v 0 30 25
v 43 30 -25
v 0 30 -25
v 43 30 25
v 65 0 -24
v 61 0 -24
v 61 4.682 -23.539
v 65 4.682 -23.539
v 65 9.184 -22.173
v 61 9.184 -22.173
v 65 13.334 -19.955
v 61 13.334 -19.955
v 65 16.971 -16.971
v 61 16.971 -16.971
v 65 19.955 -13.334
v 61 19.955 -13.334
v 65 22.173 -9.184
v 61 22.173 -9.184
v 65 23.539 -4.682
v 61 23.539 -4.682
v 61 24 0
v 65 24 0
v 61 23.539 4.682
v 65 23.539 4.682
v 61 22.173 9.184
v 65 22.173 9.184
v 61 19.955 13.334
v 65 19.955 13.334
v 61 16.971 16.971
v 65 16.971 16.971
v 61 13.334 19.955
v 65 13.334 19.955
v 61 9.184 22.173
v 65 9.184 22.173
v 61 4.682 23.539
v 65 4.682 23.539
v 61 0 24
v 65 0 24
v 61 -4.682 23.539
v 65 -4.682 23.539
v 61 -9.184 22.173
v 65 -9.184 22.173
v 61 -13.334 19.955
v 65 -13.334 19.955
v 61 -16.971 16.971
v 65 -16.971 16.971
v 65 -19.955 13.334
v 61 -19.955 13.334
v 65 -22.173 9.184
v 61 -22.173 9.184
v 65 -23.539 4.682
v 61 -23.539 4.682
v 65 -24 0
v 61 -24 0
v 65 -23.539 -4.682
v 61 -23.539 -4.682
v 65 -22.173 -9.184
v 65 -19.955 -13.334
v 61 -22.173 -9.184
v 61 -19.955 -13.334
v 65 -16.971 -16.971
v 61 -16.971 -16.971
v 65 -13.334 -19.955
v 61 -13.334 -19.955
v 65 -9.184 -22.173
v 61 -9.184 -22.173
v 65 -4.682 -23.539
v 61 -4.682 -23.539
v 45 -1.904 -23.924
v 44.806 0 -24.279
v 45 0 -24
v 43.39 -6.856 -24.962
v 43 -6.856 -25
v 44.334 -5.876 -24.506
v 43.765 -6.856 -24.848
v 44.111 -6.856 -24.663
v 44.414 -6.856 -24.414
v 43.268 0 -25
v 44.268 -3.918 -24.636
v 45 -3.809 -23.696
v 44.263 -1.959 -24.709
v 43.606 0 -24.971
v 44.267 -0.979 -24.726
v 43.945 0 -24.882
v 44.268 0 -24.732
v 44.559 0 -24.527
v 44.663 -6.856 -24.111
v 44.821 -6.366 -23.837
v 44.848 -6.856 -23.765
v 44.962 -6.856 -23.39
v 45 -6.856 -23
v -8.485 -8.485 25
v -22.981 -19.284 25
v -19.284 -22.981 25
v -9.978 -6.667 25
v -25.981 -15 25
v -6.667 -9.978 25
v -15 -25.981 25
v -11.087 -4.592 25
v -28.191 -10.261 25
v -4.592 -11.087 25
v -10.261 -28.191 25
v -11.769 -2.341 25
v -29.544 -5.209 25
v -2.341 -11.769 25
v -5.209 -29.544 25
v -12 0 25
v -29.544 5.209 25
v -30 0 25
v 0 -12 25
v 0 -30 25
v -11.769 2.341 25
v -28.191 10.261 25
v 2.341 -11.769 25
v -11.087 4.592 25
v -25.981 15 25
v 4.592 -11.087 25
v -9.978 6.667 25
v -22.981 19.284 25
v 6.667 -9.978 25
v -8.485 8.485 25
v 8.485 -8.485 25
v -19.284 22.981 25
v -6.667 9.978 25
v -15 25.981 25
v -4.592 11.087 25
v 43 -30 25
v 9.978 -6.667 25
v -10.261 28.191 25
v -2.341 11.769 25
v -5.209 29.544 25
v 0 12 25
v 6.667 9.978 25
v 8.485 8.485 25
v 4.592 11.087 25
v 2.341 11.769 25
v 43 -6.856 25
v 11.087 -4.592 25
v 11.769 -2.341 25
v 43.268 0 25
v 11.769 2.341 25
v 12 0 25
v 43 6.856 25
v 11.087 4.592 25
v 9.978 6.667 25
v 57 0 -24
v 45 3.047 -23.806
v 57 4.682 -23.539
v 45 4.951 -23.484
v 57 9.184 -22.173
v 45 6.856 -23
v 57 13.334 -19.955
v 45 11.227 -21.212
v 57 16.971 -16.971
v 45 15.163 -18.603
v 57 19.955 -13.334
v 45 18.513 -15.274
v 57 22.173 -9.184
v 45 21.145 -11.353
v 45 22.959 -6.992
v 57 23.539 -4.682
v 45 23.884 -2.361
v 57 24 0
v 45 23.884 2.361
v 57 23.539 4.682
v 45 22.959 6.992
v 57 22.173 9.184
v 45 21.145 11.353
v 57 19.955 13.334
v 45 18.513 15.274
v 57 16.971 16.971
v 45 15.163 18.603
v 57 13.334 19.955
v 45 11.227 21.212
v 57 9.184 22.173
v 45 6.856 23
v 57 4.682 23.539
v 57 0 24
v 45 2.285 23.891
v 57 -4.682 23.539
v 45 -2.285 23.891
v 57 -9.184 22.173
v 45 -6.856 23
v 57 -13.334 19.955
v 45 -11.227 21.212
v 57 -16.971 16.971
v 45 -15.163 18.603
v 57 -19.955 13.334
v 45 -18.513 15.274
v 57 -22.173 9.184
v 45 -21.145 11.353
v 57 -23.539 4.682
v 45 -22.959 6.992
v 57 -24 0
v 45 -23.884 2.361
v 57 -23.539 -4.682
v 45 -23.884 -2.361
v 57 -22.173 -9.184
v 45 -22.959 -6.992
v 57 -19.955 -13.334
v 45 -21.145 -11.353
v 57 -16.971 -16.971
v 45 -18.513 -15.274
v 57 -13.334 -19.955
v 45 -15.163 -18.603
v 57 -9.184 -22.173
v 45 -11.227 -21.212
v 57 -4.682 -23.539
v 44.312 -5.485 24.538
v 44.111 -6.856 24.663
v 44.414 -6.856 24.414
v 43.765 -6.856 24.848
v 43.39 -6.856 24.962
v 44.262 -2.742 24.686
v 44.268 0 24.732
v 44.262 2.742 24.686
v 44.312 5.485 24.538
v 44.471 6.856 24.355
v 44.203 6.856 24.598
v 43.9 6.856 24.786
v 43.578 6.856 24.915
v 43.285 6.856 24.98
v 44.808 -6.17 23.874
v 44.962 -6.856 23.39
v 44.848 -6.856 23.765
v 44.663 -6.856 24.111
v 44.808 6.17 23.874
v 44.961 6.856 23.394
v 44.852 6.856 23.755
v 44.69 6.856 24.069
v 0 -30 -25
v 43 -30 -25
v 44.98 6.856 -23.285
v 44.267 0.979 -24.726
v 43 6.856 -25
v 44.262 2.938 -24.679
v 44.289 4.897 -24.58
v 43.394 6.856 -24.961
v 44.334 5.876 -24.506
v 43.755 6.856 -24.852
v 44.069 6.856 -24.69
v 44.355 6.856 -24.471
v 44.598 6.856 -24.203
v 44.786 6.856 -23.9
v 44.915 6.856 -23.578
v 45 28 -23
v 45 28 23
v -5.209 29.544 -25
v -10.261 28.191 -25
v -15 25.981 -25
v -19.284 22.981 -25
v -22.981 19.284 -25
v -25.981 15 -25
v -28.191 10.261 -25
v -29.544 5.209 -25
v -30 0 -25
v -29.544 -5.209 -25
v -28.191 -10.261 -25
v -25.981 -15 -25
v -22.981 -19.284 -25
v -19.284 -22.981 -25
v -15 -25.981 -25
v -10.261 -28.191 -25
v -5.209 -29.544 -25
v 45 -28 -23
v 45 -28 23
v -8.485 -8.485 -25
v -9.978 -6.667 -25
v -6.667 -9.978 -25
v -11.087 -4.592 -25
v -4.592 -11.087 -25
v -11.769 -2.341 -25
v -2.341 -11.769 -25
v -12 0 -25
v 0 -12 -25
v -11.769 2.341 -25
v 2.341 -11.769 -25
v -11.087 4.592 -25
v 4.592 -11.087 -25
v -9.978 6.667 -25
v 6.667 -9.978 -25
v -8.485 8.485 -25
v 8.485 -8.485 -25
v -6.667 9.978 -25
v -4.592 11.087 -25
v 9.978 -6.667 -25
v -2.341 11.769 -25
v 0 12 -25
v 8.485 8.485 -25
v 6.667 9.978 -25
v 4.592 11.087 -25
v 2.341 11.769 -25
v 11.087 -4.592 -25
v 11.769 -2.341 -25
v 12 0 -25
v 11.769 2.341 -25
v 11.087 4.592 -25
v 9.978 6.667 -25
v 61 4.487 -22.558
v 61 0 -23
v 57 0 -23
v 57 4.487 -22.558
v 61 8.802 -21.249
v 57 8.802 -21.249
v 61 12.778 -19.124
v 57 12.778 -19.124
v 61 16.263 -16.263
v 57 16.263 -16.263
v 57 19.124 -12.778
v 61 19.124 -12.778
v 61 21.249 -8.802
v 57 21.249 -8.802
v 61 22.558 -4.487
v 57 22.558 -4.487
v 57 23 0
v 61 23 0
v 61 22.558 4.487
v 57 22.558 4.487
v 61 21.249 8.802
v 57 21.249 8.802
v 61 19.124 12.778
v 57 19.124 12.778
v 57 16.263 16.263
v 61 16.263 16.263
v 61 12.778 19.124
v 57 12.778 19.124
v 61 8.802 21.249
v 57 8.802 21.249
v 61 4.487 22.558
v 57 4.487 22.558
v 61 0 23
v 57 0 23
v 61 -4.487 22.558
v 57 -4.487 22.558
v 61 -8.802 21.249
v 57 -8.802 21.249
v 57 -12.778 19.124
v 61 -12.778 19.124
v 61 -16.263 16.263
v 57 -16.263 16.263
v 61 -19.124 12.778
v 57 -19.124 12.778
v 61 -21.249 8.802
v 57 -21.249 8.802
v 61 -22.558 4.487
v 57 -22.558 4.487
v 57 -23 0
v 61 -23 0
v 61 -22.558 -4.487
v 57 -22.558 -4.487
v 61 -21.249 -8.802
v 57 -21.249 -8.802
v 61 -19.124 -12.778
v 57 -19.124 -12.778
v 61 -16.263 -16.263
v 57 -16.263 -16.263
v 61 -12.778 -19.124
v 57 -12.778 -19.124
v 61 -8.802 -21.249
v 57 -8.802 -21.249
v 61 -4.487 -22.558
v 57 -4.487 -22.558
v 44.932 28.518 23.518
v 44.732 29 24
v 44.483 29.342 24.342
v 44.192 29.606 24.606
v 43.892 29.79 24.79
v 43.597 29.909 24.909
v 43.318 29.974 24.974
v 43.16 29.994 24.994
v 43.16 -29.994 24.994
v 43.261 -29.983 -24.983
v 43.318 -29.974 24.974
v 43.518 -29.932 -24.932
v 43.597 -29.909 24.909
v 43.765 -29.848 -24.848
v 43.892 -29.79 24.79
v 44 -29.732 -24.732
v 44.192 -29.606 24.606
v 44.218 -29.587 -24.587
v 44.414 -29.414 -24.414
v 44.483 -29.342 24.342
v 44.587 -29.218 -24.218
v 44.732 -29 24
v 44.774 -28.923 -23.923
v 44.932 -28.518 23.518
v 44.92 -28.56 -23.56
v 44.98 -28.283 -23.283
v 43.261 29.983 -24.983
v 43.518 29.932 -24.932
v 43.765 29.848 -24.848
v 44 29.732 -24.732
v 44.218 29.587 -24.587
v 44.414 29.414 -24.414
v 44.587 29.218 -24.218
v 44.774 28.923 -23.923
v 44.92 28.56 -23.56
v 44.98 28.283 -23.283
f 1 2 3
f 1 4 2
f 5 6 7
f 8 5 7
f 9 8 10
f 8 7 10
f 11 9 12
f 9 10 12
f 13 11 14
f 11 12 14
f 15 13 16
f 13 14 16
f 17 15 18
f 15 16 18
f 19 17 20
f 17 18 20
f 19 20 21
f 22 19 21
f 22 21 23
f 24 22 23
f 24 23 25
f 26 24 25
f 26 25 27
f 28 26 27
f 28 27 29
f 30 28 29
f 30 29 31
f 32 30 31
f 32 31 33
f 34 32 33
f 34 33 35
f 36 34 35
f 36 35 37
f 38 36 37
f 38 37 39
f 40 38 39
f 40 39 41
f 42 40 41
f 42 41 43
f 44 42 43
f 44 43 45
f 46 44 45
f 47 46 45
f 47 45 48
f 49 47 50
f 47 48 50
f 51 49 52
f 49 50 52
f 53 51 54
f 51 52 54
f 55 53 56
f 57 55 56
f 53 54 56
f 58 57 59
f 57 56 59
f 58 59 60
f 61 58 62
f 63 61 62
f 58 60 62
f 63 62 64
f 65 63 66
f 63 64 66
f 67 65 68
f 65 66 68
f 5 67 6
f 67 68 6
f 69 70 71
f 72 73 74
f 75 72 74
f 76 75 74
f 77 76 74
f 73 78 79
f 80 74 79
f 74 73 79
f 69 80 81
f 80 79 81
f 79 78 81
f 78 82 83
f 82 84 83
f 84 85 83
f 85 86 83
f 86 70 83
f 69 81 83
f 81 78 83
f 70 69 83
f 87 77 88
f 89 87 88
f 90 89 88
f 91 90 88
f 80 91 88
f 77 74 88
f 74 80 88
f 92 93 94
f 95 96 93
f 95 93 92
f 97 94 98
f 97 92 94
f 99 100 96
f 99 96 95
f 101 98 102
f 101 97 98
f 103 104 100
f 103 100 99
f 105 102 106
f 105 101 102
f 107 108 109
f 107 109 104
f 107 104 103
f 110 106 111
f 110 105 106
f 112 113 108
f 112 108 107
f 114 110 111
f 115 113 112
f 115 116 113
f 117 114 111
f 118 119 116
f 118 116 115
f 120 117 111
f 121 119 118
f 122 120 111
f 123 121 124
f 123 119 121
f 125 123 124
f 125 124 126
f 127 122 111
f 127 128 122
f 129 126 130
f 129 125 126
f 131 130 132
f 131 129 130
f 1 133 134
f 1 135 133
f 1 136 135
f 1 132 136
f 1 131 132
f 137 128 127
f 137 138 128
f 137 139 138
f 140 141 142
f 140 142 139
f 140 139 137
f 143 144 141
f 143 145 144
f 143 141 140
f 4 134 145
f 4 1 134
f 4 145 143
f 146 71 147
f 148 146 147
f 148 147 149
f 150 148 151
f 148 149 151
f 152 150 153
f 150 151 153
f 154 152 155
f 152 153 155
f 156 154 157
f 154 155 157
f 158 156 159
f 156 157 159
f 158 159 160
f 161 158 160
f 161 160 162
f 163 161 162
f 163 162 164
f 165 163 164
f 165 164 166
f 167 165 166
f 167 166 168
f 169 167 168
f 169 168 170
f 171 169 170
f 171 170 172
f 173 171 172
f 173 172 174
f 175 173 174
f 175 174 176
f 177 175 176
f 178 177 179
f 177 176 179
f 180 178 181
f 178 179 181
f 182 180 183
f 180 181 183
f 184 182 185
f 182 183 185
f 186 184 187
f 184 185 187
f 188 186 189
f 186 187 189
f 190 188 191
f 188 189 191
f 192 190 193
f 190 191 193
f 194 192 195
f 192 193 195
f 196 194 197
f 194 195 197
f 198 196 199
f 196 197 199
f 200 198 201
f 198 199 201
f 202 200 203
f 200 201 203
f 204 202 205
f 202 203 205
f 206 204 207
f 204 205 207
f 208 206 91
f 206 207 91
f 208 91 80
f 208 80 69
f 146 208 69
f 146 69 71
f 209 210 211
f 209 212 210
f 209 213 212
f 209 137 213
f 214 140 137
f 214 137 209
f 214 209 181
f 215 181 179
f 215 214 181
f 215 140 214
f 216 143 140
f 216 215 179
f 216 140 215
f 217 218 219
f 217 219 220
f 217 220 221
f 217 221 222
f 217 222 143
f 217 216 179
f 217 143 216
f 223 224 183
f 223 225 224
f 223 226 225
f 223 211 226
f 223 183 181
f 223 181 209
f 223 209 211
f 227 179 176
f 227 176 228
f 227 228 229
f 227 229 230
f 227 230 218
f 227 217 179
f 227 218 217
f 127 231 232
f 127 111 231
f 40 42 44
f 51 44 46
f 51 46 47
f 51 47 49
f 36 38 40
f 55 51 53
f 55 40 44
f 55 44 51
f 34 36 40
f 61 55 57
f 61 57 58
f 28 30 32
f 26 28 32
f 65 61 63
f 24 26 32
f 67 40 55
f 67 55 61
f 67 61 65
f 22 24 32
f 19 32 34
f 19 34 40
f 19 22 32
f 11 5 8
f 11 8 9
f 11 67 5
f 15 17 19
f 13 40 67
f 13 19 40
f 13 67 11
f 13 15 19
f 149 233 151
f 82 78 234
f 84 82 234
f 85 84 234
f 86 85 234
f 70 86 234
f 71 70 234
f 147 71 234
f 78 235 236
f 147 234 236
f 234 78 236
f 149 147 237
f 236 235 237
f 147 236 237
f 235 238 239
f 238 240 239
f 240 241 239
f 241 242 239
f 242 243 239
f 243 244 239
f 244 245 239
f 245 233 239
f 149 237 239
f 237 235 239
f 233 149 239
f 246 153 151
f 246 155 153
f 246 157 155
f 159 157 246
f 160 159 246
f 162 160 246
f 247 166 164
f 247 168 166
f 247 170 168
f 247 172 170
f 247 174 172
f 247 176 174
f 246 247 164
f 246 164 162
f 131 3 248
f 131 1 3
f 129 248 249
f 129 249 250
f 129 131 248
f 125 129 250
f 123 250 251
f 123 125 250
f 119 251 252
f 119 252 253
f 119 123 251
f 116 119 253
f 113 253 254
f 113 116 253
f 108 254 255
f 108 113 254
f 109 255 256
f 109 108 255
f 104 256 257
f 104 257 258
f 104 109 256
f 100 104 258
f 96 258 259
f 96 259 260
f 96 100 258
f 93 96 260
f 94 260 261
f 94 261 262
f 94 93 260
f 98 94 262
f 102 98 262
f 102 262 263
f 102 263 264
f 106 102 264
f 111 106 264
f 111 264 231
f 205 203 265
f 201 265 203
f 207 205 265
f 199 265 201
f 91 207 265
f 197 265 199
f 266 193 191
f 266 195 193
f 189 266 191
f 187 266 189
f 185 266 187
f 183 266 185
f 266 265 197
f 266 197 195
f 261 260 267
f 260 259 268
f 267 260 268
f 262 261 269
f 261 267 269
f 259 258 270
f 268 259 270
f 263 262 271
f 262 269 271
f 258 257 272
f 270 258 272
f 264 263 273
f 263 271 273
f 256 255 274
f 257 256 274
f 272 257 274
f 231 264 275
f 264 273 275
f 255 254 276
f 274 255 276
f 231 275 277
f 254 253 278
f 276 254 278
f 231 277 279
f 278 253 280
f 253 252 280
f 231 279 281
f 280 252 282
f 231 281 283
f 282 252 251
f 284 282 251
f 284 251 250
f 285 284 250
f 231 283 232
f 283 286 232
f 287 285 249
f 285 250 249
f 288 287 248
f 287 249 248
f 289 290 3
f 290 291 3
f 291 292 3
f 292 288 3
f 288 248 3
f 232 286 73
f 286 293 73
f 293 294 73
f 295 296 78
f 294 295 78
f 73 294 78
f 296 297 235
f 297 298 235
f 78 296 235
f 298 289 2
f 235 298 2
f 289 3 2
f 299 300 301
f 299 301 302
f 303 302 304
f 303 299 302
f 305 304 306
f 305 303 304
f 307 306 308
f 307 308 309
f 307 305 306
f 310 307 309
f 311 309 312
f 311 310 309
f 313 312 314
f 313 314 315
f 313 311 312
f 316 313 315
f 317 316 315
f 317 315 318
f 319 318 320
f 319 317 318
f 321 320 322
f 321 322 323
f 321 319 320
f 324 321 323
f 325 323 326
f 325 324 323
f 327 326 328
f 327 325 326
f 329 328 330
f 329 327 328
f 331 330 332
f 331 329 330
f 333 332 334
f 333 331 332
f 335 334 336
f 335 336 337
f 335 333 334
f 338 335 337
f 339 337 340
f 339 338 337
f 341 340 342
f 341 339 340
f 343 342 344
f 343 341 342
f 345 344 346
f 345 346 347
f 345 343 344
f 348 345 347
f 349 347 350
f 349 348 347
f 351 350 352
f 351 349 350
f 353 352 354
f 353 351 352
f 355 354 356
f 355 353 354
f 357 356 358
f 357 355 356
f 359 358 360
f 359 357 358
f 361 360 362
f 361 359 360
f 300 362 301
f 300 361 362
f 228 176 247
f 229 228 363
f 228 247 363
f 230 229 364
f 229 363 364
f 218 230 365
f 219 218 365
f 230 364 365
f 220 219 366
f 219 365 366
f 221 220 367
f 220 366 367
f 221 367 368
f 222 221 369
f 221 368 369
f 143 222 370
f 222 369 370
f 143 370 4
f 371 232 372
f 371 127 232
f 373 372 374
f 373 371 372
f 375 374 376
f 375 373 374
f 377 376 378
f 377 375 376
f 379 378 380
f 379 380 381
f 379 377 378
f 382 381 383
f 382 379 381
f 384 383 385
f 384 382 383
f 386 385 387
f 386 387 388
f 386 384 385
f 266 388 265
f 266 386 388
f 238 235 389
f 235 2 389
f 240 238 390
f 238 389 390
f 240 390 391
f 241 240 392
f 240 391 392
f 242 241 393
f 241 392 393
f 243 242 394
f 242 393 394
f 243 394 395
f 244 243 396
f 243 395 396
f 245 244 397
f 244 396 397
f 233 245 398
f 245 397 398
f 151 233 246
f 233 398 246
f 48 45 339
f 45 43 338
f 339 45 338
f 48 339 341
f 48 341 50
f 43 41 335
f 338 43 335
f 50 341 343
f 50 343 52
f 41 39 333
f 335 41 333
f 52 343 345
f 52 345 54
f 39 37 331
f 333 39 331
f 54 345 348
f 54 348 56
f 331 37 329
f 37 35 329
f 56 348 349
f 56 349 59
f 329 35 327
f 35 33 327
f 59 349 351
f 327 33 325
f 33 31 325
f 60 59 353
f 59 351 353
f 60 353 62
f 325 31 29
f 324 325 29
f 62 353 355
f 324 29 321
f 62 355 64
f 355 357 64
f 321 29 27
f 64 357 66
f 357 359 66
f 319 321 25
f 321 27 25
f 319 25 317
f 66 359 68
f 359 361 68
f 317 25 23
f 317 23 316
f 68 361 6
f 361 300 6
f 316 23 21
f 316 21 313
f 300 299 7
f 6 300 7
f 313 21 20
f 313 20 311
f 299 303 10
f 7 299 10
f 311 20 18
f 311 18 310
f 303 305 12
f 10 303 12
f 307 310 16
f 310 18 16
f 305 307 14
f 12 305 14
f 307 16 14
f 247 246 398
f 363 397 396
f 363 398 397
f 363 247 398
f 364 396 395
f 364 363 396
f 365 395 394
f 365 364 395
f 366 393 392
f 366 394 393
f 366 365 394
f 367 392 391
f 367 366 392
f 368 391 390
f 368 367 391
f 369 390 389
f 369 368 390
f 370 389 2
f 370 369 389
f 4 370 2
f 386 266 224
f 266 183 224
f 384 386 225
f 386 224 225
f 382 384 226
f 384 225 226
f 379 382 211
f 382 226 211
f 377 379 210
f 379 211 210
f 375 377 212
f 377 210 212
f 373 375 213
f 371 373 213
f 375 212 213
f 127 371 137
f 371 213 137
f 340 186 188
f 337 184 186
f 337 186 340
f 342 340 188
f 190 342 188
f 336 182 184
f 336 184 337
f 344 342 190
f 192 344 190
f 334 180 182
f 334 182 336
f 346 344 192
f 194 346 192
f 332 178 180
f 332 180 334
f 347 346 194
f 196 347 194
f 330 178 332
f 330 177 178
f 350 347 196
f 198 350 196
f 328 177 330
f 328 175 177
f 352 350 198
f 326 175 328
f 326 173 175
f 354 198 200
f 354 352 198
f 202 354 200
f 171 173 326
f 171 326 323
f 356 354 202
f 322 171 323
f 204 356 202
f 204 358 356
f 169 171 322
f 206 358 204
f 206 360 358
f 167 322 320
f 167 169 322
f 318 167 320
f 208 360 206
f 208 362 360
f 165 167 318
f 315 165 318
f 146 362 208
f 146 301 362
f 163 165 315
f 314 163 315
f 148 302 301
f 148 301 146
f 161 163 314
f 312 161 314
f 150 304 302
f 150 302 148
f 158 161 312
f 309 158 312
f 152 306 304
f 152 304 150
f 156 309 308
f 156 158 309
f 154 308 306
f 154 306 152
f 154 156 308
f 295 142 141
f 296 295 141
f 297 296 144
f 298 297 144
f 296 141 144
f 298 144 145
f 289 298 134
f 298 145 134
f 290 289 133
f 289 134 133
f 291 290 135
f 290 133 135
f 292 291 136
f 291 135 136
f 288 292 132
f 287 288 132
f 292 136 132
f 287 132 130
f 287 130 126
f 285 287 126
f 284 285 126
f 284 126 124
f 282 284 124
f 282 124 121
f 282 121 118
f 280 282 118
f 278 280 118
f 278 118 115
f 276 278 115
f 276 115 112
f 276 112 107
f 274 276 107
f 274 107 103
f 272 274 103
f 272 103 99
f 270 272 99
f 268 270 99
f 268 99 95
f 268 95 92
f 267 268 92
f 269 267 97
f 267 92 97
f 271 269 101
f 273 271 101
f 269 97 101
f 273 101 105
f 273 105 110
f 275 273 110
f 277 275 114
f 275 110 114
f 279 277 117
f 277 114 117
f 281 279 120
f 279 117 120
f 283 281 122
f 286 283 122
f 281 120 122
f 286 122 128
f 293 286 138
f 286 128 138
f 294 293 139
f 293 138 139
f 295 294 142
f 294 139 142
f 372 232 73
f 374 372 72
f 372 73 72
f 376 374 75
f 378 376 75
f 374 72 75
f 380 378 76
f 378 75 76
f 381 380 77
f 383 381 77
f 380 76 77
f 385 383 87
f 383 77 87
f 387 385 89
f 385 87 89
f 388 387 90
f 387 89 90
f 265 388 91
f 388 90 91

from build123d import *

# Parameters (mm, degrees)
BOSS_EXTRU_1_DEPTH      = 25
ESQUISSE2_R             = 12
ENL_V_MAT_EXTRU_1_DEPTH = 74.654599313
ESQUISSE3_R             = 24
BOSS_EXTRU_2_DEPTH      = 20
ESQUISSE4_R             = 24.5
ESQUISSE4_R_2           = 23
ENL_V_MAT_EXTRU_2_DEPTH = 4
CONG_1_R                = 2


with BuildPart() as part:
    # Esquisse1 → Boss.-Extru.1 (new, symmetric)
    with BuildSketch(Plane.XY):
        with BuildLine():
            Line((0, -30), (45, -30))
            Line((45, -30), (45, 30))
            Line((45, 30), (0, 30))
            ThreePointArc((0, 30), (-30, 0), (0, -30))
        make_face()
    extrude(amount=BOSS_EXTRU_1_DEPTH, both=True)

    # Esquisse2 → Enlèv. mat.-Extru.1 (cut, through all)
    with BuildSketch(Plane.XY.offset(25)):
        Circle(ESQUISSE2_R)
    extrude(amount=-ENL_V_MAT_EXTRU_1_DEPTH, mode=Mode.SUBTRACT)

    # Esquisse3 → Boss.-Extru.2 (add)
    with BuildSketch(Plane(origin=(45, 0, 0), x_dir=(0, 0, -1), z_dir=(1, 0, 0))):
        Circle(ESQUISSE3_R)
    extrude(amount=BOSS_EXTRU_2_DEPTH)

    # Esquisse4 → Enlèv. mat.-Extru.2 (cut)
    with BuildSketch(Plane(origin=(61, 0, 0), x_dir=(0, 0, -1), z_dir=(1, 0, 0))):
        Circle(ESQUISSE4_R)
        Circle(ESQUISSE4_R_2, mode=Mode.SUBTRACT)
    extrude(amount=-ENL_V_MAT_EXTRU_2_DEPTH, mode=Mode.SUBTRACT)

    # Congé1
    cong_1_edges = [part.edges().sort_by_distance(p)[0] for p in [
        (45, 0, 25),
        (45, 0, -25),
        (45, 30, 0),
        (45, -30, 0),
    ]]
    fillet(cong_1_edges, radius=CONG_1_R)


solid = part.part
